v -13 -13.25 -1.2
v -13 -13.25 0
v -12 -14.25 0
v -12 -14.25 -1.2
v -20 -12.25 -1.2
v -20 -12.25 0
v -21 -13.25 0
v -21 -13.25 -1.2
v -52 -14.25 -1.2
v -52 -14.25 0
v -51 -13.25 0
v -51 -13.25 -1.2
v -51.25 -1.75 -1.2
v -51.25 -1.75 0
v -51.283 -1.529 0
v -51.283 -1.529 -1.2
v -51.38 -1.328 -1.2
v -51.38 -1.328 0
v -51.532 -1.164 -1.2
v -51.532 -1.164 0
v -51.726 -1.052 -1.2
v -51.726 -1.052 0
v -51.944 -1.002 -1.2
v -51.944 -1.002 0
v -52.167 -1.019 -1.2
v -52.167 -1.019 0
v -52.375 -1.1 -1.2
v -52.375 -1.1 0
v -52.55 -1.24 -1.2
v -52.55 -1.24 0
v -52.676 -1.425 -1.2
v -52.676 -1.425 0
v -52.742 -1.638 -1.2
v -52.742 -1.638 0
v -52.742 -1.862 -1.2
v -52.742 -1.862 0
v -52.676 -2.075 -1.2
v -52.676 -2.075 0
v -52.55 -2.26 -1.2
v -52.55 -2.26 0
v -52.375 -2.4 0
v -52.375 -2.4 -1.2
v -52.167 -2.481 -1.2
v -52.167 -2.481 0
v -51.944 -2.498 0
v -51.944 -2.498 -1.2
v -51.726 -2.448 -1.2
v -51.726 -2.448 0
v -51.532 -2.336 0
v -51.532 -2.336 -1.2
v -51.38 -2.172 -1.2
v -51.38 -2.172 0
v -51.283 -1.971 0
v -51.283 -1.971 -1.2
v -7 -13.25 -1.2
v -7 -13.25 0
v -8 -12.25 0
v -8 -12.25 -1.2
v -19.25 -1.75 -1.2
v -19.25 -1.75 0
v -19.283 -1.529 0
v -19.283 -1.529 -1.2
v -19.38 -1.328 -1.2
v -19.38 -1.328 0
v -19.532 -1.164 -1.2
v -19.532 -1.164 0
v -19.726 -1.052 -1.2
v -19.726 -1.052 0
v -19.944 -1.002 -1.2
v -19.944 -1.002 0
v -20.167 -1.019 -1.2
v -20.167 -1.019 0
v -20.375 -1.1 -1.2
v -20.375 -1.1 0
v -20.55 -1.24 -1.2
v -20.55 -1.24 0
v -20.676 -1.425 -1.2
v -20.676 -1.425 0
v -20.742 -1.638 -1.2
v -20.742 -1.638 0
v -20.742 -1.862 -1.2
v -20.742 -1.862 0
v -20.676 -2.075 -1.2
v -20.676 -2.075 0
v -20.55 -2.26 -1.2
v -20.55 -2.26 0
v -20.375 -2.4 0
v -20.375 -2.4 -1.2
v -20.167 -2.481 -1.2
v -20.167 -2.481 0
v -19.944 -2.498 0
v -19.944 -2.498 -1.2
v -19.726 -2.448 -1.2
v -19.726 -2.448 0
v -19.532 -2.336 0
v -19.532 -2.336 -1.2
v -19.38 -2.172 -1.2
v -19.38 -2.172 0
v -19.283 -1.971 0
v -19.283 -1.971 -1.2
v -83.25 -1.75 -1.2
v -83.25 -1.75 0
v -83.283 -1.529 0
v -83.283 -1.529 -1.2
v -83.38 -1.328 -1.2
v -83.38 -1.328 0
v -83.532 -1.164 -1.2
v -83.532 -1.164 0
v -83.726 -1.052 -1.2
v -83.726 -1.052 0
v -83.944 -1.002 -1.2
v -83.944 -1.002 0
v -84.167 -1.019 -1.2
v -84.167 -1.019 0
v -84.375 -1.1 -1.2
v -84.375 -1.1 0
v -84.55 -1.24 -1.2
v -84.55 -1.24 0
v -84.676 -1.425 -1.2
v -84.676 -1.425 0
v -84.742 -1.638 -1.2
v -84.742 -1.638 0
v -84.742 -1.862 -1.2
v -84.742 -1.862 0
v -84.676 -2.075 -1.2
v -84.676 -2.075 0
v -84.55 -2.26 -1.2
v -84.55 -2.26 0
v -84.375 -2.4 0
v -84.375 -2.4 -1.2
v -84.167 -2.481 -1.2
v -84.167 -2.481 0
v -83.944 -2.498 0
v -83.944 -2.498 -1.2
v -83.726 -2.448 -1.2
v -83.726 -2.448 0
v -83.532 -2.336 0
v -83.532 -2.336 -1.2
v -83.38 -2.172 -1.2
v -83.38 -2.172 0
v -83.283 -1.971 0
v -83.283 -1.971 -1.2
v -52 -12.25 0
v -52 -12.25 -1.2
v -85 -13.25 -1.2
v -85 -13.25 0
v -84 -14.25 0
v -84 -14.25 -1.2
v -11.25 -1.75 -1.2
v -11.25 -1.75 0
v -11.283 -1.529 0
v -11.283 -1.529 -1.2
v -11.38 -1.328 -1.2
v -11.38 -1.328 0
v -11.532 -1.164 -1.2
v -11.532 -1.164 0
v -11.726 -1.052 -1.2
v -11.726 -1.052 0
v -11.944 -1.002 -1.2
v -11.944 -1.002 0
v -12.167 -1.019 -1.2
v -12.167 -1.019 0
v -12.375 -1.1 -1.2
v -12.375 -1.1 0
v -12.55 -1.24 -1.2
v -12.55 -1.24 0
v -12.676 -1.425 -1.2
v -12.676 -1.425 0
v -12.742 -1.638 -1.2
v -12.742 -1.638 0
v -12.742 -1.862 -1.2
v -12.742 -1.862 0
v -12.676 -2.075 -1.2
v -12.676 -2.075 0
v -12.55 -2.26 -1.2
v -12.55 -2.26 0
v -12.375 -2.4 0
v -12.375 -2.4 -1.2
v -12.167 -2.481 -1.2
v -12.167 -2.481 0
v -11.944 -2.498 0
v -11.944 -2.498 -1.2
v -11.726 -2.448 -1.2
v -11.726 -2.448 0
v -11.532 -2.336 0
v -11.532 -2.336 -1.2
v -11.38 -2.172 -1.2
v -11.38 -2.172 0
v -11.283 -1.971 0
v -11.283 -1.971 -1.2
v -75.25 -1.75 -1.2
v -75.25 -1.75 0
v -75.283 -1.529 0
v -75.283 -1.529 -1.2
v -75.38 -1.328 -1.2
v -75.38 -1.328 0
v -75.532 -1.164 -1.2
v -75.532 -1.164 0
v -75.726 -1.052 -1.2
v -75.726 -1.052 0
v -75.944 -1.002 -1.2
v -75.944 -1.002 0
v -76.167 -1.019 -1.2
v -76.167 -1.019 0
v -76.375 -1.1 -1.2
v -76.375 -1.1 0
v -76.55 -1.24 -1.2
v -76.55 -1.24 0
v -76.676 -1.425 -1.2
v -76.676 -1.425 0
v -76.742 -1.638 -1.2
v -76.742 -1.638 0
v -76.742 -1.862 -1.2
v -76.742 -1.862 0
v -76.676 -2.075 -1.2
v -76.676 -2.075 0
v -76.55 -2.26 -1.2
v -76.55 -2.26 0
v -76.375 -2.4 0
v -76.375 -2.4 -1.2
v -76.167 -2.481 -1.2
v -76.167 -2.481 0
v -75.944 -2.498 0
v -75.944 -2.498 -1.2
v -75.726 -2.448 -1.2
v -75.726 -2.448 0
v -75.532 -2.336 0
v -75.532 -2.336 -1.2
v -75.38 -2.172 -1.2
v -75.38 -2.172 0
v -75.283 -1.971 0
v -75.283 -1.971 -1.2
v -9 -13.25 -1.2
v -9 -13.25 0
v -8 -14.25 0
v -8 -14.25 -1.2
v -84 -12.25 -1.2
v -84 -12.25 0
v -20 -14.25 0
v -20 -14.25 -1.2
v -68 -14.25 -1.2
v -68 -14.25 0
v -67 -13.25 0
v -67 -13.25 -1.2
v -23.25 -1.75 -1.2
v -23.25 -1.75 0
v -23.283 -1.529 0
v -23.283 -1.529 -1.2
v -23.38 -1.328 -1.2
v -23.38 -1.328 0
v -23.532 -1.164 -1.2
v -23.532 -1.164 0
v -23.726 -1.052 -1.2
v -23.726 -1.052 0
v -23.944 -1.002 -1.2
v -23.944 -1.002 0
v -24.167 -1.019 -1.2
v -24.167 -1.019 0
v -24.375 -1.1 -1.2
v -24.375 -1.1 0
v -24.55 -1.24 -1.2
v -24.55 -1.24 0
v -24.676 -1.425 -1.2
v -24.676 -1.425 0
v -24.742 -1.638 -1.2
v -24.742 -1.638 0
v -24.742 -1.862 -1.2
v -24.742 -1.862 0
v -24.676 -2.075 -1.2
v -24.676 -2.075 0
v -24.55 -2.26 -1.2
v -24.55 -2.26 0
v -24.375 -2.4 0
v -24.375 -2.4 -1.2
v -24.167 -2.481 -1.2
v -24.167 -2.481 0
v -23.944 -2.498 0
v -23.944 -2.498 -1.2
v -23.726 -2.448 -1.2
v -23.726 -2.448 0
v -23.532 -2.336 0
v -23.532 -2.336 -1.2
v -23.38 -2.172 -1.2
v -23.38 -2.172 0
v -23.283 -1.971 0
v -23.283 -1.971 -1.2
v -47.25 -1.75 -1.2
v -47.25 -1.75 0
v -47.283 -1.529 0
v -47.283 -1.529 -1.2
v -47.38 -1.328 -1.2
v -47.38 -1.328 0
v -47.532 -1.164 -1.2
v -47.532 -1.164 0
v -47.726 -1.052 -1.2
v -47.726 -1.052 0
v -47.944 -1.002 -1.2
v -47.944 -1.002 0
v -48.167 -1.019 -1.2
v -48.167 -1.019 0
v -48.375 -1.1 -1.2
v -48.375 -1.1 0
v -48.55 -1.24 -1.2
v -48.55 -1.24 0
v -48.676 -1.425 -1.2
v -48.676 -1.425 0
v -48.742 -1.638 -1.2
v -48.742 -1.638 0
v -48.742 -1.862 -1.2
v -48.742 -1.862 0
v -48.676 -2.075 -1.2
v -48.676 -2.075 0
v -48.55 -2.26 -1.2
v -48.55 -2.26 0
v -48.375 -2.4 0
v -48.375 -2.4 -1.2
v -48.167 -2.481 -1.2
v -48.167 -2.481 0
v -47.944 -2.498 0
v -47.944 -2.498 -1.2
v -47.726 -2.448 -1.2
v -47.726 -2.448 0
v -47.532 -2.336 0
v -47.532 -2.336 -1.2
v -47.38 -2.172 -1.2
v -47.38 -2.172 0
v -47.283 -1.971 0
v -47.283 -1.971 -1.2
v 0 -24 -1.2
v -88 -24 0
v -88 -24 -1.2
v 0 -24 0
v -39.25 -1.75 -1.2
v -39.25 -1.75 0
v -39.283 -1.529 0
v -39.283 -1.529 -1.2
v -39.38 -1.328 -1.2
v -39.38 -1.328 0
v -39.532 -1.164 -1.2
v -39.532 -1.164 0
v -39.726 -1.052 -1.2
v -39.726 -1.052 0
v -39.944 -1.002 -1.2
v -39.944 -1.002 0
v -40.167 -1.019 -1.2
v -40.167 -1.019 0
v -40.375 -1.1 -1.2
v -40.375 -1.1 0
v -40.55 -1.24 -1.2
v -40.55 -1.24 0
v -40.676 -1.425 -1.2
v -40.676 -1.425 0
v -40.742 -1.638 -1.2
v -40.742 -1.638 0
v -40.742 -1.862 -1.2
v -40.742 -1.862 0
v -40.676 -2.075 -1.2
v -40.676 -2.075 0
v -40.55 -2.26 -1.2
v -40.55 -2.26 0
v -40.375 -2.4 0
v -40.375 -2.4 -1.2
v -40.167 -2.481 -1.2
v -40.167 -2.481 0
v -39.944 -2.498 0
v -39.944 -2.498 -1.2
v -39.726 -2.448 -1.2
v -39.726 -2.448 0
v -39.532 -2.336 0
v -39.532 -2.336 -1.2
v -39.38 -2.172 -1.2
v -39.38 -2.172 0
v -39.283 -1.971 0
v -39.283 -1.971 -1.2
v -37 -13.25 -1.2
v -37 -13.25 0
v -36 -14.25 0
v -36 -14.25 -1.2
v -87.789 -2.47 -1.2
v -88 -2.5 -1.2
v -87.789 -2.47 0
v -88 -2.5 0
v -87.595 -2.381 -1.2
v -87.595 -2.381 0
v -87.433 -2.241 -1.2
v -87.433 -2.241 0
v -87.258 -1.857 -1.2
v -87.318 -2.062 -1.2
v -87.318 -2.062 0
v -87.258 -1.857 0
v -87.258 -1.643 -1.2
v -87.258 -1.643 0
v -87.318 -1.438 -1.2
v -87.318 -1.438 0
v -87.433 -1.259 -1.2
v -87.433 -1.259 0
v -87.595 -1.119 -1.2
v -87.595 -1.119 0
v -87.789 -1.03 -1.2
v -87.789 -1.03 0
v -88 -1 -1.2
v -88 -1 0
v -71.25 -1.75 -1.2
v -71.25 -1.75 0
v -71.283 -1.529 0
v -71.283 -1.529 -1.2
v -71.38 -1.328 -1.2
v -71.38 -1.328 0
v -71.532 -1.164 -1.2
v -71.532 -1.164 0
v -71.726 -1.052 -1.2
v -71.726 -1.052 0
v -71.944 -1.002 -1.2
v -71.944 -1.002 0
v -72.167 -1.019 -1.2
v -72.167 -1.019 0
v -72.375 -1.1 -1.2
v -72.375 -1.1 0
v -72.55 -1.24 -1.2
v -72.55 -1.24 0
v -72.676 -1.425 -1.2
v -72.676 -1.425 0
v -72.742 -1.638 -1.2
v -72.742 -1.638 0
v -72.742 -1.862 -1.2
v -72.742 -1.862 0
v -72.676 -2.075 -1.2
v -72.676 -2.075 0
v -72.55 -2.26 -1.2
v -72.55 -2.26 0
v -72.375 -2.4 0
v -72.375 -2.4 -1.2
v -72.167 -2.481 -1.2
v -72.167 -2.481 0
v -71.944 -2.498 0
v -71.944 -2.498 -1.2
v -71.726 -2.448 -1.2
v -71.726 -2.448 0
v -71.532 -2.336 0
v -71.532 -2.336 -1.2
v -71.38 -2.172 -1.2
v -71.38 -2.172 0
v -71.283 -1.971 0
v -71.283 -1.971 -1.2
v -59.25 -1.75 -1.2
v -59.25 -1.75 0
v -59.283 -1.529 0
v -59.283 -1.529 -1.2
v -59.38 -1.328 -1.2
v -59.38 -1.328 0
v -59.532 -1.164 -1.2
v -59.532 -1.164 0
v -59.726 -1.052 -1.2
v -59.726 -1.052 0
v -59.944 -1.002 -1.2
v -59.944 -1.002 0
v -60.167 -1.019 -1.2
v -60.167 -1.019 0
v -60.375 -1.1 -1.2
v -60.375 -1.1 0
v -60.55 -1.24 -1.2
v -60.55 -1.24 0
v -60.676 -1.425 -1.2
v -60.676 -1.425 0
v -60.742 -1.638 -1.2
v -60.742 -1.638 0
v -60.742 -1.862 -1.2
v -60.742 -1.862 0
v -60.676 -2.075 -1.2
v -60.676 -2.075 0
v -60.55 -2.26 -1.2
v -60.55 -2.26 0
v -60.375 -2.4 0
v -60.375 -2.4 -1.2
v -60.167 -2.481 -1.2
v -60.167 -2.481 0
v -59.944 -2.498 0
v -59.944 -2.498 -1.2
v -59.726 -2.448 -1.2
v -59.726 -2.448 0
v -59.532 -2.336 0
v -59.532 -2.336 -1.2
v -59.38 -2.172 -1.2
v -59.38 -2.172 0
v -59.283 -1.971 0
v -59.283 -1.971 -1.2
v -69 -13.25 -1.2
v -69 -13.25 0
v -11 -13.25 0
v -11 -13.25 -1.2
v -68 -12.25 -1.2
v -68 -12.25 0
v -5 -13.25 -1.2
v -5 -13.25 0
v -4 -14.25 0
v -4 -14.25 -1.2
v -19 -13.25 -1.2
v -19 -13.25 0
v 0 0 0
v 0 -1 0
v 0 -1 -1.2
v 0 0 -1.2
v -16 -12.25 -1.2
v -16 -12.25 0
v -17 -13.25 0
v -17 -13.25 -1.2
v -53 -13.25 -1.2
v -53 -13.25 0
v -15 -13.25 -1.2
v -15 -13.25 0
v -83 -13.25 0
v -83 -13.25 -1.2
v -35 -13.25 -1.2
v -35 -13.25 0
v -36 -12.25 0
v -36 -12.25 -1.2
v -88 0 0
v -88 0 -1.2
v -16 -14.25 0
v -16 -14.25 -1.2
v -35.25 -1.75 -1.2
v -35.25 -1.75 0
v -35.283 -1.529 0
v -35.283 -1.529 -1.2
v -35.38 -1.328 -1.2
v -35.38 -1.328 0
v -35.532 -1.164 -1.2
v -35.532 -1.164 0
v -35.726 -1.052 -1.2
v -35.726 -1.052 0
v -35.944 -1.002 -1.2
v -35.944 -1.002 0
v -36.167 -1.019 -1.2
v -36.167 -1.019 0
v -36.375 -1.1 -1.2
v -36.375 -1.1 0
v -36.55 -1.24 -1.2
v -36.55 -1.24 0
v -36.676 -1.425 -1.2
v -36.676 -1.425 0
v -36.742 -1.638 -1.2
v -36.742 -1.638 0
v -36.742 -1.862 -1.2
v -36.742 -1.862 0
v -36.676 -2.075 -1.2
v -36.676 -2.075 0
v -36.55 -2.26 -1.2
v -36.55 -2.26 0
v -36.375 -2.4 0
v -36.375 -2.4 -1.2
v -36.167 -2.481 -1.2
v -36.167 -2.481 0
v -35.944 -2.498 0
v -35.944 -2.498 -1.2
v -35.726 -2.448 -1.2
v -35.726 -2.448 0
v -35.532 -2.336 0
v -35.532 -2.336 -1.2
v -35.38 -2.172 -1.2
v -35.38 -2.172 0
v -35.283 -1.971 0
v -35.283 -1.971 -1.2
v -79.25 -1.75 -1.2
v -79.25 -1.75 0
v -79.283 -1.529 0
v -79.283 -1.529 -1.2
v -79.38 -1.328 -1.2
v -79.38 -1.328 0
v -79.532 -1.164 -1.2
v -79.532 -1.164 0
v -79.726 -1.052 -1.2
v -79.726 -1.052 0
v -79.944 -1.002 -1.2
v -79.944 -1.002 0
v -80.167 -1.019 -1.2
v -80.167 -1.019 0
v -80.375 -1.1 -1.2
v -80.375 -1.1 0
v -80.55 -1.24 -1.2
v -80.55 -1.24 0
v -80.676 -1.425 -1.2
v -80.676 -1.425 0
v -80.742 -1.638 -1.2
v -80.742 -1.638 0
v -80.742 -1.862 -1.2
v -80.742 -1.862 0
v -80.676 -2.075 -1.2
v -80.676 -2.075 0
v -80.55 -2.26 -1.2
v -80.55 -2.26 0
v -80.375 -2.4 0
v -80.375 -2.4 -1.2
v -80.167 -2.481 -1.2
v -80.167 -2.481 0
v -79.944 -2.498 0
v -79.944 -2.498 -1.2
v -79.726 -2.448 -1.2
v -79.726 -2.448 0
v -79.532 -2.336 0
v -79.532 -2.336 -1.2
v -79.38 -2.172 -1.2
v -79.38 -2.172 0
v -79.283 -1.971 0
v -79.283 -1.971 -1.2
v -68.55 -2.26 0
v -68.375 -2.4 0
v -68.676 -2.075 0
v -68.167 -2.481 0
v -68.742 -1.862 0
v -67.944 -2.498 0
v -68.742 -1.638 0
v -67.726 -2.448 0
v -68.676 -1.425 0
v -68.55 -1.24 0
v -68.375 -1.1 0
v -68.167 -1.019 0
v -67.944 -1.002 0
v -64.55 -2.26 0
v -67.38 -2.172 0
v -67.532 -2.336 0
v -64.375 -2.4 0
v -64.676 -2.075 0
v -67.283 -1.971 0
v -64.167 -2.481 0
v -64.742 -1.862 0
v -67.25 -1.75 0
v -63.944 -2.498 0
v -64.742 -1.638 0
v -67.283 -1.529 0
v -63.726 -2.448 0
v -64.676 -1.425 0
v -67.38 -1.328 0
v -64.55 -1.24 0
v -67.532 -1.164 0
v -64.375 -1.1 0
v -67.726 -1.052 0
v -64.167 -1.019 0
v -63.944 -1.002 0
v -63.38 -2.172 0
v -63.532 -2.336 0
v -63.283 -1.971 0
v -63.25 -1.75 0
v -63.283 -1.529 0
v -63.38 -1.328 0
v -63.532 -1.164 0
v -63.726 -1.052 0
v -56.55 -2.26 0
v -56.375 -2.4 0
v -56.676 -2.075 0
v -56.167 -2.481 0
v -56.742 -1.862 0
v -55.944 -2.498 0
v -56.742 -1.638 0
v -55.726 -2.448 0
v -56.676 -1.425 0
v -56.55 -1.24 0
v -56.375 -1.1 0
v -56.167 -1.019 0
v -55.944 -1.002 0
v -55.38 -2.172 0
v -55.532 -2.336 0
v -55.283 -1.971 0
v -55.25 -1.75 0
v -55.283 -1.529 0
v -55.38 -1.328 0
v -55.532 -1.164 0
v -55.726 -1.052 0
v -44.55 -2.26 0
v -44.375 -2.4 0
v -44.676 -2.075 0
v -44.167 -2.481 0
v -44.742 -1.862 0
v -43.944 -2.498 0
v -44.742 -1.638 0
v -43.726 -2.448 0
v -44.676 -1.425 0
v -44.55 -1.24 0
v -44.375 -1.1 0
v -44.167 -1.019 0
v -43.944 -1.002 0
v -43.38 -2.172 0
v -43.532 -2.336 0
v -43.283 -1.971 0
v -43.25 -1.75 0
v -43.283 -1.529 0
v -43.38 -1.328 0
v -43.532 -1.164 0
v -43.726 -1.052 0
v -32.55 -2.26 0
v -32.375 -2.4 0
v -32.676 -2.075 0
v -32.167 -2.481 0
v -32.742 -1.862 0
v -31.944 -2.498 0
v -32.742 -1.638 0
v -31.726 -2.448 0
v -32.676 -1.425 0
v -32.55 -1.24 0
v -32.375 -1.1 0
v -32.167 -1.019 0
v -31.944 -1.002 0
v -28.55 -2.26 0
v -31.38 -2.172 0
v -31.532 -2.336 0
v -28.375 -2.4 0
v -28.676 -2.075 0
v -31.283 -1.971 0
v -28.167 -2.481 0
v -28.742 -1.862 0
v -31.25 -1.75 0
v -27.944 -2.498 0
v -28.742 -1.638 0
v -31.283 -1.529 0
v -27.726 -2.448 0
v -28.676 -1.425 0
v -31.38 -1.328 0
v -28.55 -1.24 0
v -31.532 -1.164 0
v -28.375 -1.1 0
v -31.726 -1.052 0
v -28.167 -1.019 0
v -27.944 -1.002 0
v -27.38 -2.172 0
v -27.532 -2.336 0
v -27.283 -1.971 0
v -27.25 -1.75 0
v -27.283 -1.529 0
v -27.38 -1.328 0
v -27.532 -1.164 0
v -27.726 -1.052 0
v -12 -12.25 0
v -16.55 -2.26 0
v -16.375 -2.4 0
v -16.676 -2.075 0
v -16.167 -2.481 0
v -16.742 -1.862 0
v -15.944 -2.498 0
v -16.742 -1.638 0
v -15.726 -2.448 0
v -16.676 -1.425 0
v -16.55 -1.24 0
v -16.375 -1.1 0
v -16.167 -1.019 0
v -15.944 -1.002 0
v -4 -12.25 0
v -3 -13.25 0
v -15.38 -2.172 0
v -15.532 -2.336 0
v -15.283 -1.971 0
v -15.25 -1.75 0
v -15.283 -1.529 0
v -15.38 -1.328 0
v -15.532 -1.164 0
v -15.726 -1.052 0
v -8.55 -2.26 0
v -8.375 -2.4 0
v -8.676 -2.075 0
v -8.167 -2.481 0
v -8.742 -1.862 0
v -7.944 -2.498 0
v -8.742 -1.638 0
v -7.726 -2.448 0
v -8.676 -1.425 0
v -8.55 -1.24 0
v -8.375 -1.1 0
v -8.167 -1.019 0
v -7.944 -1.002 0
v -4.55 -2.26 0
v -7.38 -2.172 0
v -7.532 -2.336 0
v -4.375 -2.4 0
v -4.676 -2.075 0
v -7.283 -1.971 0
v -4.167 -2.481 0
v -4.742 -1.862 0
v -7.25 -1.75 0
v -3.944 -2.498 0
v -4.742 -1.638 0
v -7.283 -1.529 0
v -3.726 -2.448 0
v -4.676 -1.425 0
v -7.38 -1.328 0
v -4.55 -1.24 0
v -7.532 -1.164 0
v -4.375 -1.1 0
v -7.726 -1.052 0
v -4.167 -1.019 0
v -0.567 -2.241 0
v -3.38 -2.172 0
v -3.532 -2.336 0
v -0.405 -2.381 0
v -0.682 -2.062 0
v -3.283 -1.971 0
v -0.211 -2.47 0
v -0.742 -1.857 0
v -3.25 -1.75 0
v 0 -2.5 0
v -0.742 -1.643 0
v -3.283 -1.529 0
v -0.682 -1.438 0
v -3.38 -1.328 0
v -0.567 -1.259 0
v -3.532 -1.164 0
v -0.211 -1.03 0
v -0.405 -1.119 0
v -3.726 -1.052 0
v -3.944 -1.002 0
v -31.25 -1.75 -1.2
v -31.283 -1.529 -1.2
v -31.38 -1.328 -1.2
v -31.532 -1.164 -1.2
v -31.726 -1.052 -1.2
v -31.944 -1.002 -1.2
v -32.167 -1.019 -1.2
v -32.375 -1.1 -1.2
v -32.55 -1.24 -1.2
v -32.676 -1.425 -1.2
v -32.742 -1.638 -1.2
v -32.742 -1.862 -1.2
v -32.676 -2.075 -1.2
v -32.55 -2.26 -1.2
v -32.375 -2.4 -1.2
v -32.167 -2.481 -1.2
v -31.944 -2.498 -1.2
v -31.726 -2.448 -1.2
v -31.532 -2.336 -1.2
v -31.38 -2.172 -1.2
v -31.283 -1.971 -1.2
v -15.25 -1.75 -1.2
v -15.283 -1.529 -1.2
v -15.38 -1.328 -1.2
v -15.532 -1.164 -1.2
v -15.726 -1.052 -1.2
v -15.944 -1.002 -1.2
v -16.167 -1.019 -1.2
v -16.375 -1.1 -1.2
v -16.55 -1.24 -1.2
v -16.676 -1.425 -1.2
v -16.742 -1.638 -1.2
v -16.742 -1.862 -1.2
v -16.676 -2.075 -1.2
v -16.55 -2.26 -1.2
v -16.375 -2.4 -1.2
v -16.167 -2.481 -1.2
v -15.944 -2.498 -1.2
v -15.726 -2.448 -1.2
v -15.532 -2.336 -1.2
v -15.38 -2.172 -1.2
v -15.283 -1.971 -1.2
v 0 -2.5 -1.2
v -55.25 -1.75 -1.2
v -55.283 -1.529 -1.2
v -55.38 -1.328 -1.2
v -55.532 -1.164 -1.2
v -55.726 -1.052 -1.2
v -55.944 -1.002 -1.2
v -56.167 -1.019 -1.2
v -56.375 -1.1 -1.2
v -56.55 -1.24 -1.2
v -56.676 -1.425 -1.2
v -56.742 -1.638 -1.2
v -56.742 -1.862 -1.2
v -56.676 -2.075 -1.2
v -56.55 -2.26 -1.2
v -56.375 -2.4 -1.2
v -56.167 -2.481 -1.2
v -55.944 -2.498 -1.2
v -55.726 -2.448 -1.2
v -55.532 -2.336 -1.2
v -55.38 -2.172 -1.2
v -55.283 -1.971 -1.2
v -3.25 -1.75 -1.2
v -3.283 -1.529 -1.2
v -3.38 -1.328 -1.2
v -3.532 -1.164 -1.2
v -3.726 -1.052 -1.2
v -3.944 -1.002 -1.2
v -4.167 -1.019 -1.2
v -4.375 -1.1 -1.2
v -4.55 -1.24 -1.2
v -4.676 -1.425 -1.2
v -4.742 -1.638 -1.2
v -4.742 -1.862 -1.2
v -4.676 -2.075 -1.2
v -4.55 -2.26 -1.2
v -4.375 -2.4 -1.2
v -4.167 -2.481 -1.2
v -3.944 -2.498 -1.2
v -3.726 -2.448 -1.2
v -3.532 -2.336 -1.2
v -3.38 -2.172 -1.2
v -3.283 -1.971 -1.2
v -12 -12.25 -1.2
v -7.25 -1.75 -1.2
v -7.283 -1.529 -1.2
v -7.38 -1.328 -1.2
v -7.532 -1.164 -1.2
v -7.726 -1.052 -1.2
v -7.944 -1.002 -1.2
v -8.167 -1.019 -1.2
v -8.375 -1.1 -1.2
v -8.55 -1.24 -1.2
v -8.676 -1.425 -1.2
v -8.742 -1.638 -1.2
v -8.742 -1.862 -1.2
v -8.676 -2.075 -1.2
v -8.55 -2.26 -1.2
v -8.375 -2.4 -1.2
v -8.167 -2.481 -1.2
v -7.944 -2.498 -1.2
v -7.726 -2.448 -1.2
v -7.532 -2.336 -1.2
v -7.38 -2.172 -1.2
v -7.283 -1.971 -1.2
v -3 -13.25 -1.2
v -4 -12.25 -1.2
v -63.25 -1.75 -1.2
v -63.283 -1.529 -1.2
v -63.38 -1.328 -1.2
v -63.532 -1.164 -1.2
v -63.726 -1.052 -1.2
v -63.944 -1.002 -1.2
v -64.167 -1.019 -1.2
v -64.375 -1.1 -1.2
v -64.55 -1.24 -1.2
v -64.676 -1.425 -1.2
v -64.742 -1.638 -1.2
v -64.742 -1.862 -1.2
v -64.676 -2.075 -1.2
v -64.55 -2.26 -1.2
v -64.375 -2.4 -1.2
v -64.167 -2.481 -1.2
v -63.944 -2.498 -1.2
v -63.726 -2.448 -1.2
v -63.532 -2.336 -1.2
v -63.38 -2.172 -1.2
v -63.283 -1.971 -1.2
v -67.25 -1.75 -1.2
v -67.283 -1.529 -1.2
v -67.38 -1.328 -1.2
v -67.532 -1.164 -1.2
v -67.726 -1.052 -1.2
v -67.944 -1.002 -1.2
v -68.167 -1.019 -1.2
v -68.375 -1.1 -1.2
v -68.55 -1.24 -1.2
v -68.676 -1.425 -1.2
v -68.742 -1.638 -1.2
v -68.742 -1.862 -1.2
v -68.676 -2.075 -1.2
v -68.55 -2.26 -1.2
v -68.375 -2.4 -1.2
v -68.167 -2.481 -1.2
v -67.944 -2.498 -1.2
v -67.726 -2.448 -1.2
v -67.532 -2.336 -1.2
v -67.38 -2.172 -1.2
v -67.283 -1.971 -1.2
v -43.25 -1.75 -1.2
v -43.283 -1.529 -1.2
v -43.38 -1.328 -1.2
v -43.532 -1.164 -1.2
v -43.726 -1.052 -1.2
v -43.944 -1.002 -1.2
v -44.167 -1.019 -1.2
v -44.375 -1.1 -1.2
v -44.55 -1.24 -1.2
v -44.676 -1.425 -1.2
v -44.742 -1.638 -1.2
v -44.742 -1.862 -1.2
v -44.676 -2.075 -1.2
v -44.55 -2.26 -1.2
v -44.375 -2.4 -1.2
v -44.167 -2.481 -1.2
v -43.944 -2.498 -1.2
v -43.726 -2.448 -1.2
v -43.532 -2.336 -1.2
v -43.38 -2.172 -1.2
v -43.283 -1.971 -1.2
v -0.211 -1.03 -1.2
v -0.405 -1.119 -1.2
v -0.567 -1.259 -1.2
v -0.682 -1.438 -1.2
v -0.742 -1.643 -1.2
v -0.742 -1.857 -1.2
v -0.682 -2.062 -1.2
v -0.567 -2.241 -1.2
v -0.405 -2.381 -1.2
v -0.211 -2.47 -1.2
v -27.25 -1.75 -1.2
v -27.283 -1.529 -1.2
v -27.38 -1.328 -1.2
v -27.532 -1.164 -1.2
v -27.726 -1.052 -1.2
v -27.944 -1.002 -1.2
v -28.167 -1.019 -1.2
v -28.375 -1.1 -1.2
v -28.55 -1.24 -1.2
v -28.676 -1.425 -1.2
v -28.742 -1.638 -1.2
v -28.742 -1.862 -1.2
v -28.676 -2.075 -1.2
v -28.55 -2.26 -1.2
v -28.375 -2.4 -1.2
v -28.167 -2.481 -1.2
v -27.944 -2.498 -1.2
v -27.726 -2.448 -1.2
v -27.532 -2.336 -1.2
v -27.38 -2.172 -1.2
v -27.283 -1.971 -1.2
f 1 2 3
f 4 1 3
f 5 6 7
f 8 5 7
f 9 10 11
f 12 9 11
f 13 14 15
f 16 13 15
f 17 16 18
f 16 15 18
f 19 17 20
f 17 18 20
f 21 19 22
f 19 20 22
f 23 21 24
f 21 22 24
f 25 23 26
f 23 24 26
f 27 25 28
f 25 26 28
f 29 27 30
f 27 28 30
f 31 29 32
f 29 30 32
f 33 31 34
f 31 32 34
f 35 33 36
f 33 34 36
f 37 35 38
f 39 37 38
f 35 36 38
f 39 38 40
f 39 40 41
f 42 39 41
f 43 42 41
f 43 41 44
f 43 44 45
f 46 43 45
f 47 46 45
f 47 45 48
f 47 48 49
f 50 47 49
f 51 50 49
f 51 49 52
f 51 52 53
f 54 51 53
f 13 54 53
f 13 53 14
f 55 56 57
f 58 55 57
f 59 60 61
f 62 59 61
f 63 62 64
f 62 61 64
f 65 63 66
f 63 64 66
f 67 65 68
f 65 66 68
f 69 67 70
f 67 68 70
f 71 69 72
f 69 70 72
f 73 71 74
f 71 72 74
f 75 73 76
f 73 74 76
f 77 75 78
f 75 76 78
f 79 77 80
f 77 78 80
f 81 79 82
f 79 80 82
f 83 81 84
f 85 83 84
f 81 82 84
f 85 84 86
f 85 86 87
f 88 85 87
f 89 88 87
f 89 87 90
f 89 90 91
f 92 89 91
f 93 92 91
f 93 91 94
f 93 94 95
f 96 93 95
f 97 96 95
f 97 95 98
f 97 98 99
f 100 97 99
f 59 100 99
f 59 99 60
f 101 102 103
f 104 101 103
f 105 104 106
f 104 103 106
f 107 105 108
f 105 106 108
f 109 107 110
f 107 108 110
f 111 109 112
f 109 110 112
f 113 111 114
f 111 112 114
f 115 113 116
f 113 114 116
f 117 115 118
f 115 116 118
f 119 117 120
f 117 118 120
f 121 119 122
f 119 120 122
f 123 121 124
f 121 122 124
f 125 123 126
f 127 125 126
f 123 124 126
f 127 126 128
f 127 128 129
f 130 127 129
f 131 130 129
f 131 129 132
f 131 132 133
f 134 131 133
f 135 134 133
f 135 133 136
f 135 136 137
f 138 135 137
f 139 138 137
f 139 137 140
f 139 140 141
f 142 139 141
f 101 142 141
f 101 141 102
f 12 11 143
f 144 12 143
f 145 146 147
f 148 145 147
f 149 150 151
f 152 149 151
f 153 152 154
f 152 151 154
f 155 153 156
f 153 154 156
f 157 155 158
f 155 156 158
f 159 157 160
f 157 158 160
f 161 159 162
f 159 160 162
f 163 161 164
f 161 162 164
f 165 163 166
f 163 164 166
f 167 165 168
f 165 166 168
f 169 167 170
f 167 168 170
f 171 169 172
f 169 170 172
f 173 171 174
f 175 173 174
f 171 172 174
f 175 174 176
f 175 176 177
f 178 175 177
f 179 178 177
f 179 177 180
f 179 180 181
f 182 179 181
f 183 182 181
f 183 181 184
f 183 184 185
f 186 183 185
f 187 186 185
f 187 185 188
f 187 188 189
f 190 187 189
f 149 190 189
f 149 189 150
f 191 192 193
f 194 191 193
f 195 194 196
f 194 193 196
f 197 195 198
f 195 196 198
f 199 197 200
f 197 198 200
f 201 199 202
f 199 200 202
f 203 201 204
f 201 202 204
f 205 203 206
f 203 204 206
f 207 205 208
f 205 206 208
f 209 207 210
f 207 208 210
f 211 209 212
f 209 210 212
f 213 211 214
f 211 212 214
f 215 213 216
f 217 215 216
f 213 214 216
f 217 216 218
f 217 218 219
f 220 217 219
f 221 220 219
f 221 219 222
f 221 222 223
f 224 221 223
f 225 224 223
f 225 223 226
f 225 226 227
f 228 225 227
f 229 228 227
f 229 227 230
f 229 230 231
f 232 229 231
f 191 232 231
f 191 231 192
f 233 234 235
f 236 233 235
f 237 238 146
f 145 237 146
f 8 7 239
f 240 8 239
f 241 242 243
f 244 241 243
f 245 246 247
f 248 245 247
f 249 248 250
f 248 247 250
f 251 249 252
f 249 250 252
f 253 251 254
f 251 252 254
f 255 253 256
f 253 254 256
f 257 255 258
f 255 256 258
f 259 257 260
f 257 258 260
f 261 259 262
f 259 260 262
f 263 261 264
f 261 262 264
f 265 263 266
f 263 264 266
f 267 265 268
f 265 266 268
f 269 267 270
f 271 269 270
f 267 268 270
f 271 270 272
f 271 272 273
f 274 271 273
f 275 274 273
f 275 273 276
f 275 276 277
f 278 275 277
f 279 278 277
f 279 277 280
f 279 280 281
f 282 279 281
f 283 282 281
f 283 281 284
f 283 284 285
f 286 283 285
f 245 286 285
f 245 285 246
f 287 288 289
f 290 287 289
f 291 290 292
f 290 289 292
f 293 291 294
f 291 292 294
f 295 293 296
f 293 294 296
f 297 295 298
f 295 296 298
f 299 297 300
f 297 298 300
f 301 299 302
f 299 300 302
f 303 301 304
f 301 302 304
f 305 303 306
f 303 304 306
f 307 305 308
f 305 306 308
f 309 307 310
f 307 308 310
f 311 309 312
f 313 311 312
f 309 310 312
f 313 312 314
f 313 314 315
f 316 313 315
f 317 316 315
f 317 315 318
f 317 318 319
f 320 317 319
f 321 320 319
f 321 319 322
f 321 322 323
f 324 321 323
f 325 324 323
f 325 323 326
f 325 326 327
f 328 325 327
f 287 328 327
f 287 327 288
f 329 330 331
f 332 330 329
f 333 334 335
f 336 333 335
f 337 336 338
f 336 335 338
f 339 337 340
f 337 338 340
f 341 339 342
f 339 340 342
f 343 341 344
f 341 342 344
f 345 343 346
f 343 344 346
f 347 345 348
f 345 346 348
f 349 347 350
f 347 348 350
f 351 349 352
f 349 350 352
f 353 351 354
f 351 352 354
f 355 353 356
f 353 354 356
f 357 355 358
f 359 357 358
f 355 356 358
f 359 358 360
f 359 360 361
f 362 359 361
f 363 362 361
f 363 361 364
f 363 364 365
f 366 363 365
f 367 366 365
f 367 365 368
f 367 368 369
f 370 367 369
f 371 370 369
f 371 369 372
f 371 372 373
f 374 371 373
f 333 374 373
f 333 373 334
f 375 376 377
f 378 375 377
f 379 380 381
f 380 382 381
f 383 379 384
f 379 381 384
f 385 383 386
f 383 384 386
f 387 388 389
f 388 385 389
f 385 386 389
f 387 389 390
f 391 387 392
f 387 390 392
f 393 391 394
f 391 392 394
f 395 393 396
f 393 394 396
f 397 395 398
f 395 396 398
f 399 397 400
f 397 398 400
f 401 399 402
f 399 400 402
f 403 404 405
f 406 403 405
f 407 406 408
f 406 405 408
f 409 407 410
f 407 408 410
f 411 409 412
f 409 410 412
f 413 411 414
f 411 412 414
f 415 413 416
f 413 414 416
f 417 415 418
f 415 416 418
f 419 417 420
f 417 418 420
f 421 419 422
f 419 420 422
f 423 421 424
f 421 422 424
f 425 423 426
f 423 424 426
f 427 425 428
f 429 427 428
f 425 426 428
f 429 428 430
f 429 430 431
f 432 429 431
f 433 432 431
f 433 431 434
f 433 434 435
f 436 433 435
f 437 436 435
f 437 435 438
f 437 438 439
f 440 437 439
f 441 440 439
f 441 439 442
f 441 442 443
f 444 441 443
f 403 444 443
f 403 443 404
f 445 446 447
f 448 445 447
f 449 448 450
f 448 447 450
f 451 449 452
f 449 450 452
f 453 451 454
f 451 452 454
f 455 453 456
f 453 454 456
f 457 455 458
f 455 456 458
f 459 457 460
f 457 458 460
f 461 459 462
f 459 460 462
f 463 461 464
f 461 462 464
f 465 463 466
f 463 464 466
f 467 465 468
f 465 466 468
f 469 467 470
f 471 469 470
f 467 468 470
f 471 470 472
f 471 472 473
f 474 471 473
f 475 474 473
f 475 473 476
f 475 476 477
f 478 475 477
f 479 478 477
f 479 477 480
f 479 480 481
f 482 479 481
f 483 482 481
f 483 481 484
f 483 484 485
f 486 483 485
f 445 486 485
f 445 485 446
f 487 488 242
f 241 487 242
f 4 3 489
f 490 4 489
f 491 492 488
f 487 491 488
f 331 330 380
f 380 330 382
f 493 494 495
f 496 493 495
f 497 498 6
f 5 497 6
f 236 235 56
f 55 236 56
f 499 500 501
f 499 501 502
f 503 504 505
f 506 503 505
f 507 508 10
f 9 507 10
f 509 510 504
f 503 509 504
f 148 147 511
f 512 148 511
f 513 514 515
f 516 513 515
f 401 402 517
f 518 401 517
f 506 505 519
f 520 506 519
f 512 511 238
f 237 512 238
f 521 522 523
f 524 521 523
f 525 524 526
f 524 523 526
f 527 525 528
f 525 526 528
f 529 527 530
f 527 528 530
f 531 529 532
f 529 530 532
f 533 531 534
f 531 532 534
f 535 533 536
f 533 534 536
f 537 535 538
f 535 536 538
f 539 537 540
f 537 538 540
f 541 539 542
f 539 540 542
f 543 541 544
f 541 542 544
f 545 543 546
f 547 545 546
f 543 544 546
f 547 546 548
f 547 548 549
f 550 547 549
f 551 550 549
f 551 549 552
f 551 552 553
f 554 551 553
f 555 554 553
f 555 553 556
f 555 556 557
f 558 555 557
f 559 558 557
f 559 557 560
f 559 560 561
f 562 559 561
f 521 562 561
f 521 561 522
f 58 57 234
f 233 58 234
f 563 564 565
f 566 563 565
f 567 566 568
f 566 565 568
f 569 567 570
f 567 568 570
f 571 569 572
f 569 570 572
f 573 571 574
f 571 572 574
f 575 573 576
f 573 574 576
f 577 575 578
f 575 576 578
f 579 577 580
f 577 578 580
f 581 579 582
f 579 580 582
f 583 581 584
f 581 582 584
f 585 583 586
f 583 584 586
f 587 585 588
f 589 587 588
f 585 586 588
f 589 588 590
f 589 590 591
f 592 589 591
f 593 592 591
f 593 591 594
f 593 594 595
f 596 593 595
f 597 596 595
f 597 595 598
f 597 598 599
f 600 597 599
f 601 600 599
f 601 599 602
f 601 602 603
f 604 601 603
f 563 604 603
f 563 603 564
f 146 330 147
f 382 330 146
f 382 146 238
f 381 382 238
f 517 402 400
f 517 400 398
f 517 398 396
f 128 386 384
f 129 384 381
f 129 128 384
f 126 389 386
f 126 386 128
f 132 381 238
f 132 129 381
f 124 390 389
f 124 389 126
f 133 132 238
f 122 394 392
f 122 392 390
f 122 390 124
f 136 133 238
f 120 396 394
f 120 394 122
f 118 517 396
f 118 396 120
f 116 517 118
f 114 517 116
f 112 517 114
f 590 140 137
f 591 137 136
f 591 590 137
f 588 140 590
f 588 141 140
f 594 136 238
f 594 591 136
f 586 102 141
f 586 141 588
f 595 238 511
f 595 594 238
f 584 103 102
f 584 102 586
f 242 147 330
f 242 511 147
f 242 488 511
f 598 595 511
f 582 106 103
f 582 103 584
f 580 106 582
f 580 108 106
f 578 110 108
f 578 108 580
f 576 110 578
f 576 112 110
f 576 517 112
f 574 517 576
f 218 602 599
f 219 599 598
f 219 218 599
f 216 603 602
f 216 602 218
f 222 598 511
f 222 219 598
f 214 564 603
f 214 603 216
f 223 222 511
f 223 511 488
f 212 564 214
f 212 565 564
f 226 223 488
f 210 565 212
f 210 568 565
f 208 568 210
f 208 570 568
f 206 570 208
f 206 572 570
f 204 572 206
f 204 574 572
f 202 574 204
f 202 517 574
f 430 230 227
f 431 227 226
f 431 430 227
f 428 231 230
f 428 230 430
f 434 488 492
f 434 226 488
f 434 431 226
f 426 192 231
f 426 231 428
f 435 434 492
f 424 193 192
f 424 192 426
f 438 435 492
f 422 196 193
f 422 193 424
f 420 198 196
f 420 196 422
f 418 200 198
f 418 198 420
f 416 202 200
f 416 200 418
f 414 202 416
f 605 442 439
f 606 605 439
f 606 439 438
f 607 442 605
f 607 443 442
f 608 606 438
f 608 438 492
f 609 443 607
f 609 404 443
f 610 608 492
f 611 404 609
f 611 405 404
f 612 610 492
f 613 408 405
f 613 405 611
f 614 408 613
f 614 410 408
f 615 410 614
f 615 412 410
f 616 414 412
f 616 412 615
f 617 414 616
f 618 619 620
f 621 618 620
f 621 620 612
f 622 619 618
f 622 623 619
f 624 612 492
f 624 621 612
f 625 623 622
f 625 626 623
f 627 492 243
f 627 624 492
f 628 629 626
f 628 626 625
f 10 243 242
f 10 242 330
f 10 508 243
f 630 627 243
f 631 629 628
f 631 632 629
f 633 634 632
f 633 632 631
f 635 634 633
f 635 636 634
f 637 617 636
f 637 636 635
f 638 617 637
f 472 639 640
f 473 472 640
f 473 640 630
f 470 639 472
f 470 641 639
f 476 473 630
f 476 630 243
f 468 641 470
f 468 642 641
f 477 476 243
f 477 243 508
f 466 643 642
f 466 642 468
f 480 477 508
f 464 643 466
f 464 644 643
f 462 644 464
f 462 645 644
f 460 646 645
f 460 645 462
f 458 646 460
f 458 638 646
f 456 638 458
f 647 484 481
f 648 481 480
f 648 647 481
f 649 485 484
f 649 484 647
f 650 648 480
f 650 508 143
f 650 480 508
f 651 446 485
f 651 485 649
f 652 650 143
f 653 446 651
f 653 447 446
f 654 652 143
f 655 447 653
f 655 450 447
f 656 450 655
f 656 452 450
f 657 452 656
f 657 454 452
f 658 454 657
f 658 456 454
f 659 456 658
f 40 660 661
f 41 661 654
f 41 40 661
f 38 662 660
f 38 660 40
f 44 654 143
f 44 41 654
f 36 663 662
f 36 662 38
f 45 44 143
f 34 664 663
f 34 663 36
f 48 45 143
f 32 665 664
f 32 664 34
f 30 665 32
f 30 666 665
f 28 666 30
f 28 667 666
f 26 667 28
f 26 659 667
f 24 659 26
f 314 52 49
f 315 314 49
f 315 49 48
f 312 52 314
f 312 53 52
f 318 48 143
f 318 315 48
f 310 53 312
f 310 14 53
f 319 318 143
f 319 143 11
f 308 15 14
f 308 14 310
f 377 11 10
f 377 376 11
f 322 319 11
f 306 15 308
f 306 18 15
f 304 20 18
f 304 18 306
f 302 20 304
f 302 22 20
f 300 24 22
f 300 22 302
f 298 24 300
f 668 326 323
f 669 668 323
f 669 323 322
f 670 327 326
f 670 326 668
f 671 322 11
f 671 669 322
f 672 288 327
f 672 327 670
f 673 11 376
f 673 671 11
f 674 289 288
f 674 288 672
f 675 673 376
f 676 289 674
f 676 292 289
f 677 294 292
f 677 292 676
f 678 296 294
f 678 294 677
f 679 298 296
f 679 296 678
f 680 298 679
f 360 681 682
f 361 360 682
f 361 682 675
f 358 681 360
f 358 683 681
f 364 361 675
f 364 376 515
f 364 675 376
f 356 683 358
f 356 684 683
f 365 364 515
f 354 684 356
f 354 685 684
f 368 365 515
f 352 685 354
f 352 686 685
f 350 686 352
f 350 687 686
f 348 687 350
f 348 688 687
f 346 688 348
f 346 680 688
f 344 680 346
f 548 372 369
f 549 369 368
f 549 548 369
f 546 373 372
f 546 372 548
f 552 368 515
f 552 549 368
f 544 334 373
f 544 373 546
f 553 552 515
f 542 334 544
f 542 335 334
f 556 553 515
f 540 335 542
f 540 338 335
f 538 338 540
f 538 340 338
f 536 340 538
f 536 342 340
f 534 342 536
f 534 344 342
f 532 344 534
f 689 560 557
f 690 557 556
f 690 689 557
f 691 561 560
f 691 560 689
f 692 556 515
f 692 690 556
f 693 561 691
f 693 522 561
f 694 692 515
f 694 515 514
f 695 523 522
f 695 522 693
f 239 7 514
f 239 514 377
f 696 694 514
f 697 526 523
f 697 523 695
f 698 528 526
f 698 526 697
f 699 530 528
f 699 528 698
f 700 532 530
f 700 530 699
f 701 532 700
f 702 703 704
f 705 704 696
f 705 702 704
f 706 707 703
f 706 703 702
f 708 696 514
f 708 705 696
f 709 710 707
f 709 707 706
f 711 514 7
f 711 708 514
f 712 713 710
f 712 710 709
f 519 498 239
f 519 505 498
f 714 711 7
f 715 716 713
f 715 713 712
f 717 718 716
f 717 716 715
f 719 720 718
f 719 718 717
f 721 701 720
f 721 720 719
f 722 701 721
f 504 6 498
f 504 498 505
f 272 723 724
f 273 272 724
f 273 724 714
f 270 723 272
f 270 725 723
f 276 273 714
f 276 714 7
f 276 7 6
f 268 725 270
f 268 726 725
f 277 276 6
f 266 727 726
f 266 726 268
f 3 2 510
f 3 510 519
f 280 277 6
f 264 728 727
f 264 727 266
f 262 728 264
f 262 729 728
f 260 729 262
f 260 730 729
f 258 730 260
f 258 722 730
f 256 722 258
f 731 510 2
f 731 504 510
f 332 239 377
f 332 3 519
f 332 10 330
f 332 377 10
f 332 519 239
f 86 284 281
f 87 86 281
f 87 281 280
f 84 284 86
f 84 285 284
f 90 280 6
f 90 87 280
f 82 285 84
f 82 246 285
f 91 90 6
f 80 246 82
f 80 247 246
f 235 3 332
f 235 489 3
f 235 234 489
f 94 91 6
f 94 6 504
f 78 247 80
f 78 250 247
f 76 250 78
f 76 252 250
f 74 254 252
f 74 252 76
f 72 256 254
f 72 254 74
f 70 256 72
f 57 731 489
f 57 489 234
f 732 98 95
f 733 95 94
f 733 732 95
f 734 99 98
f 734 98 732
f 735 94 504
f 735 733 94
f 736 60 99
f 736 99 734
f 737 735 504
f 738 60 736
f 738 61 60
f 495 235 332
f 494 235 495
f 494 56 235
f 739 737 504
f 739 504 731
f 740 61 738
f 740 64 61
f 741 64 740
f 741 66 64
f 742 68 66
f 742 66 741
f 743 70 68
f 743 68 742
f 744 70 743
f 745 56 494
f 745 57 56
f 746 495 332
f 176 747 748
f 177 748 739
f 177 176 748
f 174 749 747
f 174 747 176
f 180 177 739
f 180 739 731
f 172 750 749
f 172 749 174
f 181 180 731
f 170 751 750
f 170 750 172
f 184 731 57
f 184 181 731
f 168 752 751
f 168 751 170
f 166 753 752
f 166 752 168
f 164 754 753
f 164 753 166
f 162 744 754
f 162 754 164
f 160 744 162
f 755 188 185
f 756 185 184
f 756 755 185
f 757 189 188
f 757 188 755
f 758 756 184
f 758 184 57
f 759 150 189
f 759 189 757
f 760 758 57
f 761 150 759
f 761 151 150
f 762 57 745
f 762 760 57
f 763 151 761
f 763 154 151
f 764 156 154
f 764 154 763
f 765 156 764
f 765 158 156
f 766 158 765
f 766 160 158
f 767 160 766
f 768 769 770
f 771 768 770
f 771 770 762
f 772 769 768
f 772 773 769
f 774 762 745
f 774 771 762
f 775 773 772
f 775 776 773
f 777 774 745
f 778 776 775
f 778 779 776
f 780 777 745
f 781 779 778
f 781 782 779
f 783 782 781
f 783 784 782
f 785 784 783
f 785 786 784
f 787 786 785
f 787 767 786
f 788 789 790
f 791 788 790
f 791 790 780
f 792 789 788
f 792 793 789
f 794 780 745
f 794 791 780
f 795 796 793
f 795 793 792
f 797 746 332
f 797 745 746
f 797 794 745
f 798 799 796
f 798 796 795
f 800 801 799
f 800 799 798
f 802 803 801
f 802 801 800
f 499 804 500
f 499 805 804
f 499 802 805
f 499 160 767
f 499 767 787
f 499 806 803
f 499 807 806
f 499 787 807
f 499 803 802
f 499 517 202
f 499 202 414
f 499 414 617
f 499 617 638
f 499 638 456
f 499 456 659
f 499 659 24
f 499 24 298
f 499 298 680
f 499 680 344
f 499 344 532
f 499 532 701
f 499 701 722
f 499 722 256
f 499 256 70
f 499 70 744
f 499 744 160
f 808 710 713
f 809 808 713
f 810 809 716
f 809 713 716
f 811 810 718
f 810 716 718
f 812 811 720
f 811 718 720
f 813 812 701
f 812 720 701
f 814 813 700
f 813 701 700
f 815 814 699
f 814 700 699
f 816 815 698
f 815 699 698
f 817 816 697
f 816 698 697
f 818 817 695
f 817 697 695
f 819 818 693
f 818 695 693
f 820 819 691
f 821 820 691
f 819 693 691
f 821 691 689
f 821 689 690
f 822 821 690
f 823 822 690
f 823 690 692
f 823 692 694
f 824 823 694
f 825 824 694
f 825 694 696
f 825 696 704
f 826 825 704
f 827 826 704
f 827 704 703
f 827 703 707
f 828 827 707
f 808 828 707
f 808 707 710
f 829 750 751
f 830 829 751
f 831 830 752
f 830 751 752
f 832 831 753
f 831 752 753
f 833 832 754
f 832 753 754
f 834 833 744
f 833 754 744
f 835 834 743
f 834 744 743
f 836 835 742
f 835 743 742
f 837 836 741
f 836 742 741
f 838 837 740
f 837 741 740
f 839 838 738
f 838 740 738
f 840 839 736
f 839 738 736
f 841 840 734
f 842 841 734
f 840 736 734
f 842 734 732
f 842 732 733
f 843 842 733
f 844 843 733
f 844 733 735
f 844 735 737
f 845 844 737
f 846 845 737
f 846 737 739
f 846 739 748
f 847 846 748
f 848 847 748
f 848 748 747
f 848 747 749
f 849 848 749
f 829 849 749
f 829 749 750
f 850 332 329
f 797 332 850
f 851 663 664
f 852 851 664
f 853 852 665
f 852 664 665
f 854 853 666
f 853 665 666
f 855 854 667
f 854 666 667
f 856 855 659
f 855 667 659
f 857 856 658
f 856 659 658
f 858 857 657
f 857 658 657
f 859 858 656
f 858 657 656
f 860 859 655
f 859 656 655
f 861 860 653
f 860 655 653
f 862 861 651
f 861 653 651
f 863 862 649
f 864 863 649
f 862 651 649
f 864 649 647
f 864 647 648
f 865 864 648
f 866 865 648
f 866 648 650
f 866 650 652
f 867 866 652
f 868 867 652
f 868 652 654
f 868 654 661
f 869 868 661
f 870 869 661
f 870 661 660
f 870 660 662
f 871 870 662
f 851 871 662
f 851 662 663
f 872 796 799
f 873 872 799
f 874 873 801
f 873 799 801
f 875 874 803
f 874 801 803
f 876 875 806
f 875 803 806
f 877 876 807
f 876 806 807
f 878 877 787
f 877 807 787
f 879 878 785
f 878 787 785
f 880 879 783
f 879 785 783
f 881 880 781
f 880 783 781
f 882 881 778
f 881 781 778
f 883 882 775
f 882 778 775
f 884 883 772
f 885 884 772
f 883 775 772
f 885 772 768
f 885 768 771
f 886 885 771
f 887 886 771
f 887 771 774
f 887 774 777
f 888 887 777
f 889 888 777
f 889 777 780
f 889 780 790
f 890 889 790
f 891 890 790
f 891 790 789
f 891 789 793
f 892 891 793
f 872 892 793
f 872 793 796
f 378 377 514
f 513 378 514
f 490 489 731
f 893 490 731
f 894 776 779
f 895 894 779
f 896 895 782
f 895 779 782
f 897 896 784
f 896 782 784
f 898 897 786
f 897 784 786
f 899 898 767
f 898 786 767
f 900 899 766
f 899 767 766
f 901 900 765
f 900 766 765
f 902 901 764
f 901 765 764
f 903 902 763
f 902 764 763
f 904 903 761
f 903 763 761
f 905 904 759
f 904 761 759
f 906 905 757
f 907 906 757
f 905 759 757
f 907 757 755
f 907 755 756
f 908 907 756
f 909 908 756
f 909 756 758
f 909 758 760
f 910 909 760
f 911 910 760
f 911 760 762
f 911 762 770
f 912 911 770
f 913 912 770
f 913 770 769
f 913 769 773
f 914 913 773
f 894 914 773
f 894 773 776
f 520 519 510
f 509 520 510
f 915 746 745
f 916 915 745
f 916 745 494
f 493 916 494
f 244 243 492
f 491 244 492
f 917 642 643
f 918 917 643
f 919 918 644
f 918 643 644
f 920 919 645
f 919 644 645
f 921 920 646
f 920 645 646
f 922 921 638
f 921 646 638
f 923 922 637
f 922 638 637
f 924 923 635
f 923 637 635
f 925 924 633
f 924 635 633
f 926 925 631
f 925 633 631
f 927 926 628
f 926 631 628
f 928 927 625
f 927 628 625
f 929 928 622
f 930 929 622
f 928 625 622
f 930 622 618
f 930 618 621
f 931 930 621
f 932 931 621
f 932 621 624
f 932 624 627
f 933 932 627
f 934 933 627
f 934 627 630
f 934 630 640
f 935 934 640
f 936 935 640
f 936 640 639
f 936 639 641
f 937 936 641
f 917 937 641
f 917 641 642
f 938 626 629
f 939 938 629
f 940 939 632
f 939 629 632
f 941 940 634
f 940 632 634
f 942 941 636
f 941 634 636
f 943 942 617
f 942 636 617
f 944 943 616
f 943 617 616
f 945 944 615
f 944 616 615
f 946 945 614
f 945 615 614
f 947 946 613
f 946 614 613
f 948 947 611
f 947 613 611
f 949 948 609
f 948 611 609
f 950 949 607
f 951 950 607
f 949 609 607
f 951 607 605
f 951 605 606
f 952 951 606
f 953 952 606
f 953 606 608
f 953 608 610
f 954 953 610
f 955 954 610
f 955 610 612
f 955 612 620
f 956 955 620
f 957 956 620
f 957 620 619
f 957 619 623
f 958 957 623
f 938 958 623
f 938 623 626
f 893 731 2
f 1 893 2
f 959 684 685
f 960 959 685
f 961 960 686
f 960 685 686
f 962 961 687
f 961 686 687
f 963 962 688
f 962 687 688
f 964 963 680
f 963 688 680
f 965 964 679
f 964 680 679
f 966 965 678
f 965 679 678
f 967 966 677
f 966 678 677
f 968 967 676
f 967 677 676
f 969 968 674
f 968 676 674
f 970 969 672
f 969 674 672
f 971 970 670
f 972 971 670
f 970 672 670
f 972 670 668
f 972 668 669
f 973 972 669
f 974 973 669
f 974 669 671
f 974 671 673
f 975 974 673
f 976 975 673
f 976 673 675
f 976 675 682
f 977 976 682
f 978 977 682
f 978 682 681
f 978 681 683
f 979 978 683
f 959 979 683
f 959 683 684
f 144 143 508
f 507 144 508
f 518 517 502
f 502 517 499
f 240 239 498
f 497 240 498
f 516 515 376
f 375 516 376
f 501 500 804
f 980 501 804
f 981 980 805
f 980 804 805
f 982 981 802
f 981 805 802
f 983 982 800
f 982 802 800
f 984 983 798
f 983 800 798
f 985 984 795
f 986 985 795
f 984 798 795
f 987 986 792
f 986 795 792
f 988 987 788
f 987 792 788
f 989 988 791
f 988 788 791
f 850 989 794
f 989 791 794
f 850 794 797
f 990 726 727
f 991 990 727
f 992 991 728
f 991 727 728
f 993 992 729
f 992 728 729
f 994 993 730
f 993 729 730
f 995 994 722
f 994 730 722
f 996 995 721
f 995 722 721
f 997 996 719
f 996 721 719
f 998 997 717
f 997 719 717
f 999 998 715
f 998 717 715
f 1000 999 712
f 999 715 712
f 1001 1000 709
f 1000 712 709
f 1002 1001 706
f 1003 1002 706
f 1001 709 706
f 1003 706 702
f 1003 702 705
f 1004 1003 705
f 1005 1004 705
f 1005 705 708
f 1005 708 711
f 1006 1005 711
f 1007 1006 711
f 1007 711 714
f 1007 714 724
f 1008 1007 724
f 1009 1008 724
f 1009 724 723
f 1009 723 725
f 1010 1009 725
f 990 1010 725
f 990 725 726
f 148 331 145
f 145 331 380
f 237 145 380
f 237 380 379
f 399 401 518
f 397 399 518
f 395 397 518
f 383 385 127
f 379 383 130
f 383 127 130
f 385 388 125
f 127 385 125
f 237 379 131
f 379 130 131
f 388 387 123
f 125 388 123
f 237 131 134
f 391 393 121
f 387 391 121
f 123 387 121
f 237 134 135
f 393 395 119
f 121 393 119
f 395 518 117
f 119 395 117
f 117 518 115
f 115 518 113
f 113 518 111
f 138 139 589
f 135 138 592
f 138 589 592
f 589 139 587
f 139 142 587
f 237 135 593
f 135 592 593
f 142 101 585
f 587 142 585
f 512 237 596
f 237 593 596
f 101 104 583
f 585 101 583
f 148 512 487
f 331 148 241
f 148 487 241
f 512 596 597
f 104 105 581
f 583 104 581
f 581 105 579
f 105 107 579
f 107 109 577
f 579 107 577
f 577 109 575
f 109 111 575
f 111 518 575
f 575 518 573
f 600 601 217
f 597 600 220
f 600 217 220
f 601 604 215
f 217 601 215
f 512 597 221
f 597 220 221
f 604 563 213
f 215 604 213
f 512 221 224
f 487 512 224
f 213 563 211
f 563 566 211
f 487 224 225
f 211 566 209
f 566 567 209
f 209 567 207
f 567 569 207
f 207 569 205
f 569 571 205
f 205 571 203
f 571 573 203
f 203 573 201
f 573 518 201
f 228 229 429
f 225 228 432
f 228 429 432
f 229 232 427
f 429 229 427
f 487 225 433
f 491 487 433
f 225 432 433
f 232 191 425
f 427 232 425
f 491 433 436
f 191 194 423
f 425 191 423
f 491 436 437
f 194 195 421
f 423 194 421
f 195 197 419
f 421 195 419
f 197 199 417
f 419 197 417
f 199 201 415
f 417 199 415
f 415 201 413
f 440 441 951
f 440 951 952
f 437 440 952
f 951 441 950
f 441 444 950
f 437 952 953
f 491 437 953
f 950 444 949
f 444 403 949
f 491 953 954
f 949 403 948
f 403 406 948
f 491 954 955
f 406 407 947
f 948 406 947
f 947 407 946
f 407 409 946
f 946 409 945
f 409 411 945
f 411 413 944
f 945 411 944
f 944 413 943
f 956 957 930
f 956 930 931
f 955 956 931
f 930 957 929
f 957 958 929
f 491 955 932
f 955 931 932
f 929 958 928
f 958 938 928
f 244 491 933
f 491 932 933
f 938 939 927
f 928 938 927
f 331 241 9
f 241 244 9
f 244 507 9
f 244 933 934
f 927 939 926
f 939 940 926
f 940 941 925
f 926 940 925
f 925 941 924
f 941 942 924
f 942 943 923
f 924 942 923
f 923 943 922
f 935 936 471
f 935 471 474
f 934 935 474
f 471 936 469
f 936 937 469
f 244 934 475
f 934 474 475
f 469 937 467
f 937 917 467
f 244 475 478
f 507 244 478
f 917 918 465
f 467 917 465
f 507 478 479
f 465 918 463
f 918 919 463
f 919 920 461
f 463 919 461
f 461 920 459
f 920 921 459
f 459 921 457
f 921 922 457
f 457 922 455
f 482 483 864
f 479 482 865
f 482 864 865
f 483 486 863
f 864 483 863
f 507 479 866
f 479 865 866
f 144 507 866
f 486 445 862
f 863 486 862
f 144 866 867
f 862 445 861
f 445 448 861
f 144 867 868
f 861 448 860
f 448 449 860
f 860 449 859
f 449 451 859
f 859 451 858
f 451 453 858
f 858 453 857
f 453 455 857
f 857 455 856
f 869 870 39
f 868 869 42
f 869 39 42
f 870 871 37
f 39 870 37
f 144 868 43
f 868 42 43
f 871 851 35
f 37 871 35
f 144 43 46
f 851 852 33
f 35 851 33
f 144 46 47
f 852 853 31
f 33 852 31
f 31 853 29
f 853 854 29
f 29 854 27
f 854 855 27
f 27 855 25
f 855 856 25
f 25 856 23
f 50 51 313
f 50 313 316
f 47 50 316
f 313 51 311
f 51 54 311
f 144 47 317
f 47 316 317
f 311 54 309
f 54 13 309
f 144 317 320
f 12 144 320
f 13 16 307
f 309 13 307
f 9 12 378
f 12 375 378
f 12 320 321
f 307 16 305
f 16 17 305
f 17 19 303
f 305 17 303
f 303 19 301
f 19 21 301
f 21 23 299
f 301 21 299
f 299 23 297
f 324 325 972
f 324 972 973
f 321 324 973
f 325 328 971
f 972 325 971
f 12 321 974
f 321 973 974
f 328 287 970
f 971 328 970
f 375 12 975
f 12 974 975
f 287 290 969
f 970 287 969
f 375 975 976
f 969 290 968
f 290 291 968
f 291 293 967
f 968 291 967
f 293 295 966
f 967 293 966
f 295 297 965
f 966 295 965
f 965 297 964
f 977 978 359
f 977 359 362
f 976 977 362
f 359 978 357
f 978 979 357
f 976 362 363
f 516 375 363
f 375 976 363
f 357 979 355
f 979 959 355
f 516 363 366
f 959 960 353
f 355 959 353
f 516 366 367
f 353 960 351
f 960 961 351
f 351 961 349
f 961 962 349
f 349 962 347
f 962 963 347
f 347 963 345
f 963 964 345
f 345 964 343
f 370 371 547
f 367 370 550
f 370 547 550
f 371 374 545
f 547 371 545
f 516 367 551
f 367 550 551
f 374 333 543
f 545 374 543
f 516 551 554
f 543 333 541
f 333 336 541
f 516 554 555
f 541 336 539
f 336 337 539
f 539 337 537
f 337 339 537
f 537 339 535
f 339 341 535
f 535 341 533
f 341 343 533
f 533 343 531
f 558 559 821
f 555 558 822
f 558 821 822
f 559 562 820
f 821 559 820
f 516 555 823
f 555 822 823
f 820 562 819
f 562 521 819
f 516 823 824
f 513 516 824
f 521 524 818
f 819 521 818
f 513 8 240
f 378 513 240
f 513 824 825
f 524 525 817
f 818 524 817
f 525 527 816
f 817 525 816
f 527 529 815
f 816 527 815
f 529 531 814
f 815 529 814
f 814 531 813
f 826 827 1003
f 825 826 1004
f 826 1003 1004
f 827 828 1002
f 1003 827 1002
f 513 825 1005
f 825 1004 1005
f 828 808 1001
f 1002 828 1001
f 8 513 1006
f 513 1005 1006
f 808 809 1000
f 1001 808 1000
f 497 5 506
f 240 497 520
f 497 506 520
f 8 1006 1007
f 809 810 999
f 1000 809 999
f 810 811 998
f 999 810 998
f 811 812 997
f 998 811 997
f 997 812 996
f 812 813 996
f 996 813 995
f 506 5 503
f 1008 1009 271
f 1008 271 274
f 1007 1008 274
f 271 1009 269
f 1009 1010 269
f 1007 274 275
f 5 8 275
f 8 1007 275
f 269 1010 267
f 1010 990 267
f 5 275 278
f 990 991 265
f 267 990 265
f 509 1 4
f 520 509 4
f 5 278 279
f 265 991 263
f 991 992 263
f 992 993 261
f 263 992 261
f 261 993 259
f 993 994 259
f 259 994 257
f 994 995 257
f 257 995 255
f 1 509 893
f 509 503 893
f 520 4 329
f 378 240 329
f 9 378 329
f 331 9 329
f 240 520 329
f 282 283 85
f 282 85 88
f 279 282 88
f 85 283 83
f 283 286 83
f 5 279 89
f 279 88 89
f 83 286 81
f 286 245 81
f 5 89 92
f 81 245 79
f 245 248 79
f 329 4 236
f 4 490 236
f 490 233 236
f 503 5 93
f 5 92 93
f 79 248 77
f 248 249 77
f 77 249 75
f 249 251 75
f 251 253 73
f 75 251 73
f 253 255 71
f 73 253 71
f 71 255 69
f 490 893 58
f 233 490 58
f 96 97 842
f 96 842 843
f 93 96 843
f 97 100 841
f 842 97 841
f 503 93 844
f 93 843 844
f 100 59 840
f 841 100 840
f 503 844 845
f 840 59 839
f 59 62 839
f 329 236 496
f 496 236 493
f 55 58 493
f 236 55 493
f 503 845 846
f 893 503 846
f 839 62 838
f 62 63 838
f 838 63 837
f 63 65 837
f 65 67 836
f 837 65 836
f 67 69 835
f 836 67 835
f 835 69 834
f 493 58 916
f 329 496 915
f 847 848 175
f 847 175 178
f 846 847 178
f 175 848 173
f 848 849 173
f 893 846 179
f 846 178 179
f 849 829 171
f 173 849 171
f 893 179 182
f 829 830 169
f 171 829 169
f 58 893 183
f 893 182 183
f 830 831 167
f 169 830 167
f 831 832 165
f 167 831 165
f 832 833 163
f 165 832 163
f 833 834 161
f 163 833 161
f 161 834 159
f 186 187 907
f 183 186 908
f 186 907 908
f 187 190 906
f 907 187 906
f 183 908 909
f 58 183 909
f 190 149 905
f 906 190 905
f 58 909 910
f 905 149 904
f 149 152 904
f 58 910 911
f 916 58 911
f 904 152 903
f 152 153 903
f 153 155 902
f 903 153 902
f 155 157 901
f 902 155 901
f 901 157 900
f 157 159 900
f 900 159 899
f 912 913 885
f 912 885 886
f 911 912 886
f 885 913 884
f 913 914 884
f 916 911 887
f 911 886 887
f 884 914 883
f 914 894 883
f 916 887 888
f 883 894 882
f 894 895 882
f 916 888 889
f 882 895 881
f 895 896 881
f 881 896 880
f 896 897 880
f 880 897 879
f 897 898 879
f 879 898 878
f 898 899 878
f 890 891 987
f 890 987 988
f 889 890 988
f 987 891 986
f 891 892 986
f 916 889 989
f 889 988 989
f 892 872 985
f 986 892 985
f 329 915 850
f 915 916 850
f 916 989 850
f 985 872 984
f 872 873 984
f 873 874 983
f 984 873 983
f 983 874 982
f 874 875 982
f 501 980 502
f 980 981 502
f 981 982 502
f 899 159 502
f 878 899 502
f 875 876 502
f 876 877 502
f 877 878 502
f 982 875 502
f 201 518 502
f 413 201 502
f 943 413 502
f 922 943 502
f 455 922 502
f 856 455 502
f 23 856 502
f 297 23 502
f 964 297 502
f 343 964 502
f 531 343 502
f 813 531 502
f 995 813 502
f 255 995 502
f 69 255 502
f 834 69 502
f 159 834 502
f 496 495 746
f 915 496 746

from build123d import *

# Parameters (mm, degrees)
TOP_SKETCH_W                   = 88
TOP_SKETCH_H                   = 24
THICKNESS_EXTRUDE_DEPTH        = 1.2
PIN_HOLE_SKETCH_R              = 0.75
FIRST_PIN_HOLE_CUT_DEPTH       = 92.221927189
PIN_HOLE_PATTERN_COUNT         = 23
PIN_HOLE_PATTERN_PITCH         = 4
MARKER_CUT_DEPTH               = 92.221927189
COMPONENT_MARKER_PATTERN_COUNT = 4
COMPONENT_MARKER_PATTERN_PITCH = 4
PIN_HOLE_MARKER_PATTERN_COUNT  = 6
PIN_HOLE_MARKER_PATTERN_PITCH  = 16


with BuildPart() as part:
    # Top Sketch → Thickness Extrude (new body)
    with BuildSketch(Plane.XY):
        with Locations((-44, -12)):
            Rectangle(TOP_SKETCH_W, TOP_SKETCH_H)
    extrude(amount=-THICKNESS_EXTRUDE_DEPTH)

    # Pin Hole Sketch → First Pin Hole Cut (cut, through all)
    with BuildSketch(Plane.XY):
        with Locations((0, -1.75)):
            Circle(PIN_HOLE_SKETCH_R)
    first_pin_hole_cut = extrude(amount=-FIRST_PIN_HOLE_CUT_DEPTH, mode=Mode.SUBTRACT)

    # Pin Hole Pattern: First Pin Hole Cut ×23
    with Locations(*[(-i * PIN_HOLE_PATTERN_PITCH, 0, 0) for i in range(1, PIN_HOLE_PATTERN_COUNT)]):
        add(first_pin_hole_cut, mode=Mode.SUBTRACT)

    # Marker Sketch → Marker Cut (cut, through all)
    with BuildSketch(Plane.XY):
        Polygon((-4, -12.25), (-5, -13.25), (-4, -14.25), (-3, -13.25), align=None)
    marker_cut = extrude(amount=-MARKER_CUT_DEPTH, mode=Mode.SUBTRACT)

    # Component Marker Pattern: Marker Cut ×4
    with Locations(*[(-i * COMPONENT_MARKER_PATTERN_PITCH, 0, 0) for i in range(1, COMPONENT_MARKER_PATTERN_COUNT)]):
        add(marker_cut, mode=Mode.SUBTRACT)

    # Pin Hole Marker Pattern: Marker Cut ×6
    with Locations(*[(-i * PIN_HOLE_MARKER_PATTERN_PITCH, 0, 0) for i in range(1, PIN_HOLE_MARKER_PATTERN_COUNT)]):
        add(marker_cut, mode=Mode.SUBTRACT)


solid = part.part
